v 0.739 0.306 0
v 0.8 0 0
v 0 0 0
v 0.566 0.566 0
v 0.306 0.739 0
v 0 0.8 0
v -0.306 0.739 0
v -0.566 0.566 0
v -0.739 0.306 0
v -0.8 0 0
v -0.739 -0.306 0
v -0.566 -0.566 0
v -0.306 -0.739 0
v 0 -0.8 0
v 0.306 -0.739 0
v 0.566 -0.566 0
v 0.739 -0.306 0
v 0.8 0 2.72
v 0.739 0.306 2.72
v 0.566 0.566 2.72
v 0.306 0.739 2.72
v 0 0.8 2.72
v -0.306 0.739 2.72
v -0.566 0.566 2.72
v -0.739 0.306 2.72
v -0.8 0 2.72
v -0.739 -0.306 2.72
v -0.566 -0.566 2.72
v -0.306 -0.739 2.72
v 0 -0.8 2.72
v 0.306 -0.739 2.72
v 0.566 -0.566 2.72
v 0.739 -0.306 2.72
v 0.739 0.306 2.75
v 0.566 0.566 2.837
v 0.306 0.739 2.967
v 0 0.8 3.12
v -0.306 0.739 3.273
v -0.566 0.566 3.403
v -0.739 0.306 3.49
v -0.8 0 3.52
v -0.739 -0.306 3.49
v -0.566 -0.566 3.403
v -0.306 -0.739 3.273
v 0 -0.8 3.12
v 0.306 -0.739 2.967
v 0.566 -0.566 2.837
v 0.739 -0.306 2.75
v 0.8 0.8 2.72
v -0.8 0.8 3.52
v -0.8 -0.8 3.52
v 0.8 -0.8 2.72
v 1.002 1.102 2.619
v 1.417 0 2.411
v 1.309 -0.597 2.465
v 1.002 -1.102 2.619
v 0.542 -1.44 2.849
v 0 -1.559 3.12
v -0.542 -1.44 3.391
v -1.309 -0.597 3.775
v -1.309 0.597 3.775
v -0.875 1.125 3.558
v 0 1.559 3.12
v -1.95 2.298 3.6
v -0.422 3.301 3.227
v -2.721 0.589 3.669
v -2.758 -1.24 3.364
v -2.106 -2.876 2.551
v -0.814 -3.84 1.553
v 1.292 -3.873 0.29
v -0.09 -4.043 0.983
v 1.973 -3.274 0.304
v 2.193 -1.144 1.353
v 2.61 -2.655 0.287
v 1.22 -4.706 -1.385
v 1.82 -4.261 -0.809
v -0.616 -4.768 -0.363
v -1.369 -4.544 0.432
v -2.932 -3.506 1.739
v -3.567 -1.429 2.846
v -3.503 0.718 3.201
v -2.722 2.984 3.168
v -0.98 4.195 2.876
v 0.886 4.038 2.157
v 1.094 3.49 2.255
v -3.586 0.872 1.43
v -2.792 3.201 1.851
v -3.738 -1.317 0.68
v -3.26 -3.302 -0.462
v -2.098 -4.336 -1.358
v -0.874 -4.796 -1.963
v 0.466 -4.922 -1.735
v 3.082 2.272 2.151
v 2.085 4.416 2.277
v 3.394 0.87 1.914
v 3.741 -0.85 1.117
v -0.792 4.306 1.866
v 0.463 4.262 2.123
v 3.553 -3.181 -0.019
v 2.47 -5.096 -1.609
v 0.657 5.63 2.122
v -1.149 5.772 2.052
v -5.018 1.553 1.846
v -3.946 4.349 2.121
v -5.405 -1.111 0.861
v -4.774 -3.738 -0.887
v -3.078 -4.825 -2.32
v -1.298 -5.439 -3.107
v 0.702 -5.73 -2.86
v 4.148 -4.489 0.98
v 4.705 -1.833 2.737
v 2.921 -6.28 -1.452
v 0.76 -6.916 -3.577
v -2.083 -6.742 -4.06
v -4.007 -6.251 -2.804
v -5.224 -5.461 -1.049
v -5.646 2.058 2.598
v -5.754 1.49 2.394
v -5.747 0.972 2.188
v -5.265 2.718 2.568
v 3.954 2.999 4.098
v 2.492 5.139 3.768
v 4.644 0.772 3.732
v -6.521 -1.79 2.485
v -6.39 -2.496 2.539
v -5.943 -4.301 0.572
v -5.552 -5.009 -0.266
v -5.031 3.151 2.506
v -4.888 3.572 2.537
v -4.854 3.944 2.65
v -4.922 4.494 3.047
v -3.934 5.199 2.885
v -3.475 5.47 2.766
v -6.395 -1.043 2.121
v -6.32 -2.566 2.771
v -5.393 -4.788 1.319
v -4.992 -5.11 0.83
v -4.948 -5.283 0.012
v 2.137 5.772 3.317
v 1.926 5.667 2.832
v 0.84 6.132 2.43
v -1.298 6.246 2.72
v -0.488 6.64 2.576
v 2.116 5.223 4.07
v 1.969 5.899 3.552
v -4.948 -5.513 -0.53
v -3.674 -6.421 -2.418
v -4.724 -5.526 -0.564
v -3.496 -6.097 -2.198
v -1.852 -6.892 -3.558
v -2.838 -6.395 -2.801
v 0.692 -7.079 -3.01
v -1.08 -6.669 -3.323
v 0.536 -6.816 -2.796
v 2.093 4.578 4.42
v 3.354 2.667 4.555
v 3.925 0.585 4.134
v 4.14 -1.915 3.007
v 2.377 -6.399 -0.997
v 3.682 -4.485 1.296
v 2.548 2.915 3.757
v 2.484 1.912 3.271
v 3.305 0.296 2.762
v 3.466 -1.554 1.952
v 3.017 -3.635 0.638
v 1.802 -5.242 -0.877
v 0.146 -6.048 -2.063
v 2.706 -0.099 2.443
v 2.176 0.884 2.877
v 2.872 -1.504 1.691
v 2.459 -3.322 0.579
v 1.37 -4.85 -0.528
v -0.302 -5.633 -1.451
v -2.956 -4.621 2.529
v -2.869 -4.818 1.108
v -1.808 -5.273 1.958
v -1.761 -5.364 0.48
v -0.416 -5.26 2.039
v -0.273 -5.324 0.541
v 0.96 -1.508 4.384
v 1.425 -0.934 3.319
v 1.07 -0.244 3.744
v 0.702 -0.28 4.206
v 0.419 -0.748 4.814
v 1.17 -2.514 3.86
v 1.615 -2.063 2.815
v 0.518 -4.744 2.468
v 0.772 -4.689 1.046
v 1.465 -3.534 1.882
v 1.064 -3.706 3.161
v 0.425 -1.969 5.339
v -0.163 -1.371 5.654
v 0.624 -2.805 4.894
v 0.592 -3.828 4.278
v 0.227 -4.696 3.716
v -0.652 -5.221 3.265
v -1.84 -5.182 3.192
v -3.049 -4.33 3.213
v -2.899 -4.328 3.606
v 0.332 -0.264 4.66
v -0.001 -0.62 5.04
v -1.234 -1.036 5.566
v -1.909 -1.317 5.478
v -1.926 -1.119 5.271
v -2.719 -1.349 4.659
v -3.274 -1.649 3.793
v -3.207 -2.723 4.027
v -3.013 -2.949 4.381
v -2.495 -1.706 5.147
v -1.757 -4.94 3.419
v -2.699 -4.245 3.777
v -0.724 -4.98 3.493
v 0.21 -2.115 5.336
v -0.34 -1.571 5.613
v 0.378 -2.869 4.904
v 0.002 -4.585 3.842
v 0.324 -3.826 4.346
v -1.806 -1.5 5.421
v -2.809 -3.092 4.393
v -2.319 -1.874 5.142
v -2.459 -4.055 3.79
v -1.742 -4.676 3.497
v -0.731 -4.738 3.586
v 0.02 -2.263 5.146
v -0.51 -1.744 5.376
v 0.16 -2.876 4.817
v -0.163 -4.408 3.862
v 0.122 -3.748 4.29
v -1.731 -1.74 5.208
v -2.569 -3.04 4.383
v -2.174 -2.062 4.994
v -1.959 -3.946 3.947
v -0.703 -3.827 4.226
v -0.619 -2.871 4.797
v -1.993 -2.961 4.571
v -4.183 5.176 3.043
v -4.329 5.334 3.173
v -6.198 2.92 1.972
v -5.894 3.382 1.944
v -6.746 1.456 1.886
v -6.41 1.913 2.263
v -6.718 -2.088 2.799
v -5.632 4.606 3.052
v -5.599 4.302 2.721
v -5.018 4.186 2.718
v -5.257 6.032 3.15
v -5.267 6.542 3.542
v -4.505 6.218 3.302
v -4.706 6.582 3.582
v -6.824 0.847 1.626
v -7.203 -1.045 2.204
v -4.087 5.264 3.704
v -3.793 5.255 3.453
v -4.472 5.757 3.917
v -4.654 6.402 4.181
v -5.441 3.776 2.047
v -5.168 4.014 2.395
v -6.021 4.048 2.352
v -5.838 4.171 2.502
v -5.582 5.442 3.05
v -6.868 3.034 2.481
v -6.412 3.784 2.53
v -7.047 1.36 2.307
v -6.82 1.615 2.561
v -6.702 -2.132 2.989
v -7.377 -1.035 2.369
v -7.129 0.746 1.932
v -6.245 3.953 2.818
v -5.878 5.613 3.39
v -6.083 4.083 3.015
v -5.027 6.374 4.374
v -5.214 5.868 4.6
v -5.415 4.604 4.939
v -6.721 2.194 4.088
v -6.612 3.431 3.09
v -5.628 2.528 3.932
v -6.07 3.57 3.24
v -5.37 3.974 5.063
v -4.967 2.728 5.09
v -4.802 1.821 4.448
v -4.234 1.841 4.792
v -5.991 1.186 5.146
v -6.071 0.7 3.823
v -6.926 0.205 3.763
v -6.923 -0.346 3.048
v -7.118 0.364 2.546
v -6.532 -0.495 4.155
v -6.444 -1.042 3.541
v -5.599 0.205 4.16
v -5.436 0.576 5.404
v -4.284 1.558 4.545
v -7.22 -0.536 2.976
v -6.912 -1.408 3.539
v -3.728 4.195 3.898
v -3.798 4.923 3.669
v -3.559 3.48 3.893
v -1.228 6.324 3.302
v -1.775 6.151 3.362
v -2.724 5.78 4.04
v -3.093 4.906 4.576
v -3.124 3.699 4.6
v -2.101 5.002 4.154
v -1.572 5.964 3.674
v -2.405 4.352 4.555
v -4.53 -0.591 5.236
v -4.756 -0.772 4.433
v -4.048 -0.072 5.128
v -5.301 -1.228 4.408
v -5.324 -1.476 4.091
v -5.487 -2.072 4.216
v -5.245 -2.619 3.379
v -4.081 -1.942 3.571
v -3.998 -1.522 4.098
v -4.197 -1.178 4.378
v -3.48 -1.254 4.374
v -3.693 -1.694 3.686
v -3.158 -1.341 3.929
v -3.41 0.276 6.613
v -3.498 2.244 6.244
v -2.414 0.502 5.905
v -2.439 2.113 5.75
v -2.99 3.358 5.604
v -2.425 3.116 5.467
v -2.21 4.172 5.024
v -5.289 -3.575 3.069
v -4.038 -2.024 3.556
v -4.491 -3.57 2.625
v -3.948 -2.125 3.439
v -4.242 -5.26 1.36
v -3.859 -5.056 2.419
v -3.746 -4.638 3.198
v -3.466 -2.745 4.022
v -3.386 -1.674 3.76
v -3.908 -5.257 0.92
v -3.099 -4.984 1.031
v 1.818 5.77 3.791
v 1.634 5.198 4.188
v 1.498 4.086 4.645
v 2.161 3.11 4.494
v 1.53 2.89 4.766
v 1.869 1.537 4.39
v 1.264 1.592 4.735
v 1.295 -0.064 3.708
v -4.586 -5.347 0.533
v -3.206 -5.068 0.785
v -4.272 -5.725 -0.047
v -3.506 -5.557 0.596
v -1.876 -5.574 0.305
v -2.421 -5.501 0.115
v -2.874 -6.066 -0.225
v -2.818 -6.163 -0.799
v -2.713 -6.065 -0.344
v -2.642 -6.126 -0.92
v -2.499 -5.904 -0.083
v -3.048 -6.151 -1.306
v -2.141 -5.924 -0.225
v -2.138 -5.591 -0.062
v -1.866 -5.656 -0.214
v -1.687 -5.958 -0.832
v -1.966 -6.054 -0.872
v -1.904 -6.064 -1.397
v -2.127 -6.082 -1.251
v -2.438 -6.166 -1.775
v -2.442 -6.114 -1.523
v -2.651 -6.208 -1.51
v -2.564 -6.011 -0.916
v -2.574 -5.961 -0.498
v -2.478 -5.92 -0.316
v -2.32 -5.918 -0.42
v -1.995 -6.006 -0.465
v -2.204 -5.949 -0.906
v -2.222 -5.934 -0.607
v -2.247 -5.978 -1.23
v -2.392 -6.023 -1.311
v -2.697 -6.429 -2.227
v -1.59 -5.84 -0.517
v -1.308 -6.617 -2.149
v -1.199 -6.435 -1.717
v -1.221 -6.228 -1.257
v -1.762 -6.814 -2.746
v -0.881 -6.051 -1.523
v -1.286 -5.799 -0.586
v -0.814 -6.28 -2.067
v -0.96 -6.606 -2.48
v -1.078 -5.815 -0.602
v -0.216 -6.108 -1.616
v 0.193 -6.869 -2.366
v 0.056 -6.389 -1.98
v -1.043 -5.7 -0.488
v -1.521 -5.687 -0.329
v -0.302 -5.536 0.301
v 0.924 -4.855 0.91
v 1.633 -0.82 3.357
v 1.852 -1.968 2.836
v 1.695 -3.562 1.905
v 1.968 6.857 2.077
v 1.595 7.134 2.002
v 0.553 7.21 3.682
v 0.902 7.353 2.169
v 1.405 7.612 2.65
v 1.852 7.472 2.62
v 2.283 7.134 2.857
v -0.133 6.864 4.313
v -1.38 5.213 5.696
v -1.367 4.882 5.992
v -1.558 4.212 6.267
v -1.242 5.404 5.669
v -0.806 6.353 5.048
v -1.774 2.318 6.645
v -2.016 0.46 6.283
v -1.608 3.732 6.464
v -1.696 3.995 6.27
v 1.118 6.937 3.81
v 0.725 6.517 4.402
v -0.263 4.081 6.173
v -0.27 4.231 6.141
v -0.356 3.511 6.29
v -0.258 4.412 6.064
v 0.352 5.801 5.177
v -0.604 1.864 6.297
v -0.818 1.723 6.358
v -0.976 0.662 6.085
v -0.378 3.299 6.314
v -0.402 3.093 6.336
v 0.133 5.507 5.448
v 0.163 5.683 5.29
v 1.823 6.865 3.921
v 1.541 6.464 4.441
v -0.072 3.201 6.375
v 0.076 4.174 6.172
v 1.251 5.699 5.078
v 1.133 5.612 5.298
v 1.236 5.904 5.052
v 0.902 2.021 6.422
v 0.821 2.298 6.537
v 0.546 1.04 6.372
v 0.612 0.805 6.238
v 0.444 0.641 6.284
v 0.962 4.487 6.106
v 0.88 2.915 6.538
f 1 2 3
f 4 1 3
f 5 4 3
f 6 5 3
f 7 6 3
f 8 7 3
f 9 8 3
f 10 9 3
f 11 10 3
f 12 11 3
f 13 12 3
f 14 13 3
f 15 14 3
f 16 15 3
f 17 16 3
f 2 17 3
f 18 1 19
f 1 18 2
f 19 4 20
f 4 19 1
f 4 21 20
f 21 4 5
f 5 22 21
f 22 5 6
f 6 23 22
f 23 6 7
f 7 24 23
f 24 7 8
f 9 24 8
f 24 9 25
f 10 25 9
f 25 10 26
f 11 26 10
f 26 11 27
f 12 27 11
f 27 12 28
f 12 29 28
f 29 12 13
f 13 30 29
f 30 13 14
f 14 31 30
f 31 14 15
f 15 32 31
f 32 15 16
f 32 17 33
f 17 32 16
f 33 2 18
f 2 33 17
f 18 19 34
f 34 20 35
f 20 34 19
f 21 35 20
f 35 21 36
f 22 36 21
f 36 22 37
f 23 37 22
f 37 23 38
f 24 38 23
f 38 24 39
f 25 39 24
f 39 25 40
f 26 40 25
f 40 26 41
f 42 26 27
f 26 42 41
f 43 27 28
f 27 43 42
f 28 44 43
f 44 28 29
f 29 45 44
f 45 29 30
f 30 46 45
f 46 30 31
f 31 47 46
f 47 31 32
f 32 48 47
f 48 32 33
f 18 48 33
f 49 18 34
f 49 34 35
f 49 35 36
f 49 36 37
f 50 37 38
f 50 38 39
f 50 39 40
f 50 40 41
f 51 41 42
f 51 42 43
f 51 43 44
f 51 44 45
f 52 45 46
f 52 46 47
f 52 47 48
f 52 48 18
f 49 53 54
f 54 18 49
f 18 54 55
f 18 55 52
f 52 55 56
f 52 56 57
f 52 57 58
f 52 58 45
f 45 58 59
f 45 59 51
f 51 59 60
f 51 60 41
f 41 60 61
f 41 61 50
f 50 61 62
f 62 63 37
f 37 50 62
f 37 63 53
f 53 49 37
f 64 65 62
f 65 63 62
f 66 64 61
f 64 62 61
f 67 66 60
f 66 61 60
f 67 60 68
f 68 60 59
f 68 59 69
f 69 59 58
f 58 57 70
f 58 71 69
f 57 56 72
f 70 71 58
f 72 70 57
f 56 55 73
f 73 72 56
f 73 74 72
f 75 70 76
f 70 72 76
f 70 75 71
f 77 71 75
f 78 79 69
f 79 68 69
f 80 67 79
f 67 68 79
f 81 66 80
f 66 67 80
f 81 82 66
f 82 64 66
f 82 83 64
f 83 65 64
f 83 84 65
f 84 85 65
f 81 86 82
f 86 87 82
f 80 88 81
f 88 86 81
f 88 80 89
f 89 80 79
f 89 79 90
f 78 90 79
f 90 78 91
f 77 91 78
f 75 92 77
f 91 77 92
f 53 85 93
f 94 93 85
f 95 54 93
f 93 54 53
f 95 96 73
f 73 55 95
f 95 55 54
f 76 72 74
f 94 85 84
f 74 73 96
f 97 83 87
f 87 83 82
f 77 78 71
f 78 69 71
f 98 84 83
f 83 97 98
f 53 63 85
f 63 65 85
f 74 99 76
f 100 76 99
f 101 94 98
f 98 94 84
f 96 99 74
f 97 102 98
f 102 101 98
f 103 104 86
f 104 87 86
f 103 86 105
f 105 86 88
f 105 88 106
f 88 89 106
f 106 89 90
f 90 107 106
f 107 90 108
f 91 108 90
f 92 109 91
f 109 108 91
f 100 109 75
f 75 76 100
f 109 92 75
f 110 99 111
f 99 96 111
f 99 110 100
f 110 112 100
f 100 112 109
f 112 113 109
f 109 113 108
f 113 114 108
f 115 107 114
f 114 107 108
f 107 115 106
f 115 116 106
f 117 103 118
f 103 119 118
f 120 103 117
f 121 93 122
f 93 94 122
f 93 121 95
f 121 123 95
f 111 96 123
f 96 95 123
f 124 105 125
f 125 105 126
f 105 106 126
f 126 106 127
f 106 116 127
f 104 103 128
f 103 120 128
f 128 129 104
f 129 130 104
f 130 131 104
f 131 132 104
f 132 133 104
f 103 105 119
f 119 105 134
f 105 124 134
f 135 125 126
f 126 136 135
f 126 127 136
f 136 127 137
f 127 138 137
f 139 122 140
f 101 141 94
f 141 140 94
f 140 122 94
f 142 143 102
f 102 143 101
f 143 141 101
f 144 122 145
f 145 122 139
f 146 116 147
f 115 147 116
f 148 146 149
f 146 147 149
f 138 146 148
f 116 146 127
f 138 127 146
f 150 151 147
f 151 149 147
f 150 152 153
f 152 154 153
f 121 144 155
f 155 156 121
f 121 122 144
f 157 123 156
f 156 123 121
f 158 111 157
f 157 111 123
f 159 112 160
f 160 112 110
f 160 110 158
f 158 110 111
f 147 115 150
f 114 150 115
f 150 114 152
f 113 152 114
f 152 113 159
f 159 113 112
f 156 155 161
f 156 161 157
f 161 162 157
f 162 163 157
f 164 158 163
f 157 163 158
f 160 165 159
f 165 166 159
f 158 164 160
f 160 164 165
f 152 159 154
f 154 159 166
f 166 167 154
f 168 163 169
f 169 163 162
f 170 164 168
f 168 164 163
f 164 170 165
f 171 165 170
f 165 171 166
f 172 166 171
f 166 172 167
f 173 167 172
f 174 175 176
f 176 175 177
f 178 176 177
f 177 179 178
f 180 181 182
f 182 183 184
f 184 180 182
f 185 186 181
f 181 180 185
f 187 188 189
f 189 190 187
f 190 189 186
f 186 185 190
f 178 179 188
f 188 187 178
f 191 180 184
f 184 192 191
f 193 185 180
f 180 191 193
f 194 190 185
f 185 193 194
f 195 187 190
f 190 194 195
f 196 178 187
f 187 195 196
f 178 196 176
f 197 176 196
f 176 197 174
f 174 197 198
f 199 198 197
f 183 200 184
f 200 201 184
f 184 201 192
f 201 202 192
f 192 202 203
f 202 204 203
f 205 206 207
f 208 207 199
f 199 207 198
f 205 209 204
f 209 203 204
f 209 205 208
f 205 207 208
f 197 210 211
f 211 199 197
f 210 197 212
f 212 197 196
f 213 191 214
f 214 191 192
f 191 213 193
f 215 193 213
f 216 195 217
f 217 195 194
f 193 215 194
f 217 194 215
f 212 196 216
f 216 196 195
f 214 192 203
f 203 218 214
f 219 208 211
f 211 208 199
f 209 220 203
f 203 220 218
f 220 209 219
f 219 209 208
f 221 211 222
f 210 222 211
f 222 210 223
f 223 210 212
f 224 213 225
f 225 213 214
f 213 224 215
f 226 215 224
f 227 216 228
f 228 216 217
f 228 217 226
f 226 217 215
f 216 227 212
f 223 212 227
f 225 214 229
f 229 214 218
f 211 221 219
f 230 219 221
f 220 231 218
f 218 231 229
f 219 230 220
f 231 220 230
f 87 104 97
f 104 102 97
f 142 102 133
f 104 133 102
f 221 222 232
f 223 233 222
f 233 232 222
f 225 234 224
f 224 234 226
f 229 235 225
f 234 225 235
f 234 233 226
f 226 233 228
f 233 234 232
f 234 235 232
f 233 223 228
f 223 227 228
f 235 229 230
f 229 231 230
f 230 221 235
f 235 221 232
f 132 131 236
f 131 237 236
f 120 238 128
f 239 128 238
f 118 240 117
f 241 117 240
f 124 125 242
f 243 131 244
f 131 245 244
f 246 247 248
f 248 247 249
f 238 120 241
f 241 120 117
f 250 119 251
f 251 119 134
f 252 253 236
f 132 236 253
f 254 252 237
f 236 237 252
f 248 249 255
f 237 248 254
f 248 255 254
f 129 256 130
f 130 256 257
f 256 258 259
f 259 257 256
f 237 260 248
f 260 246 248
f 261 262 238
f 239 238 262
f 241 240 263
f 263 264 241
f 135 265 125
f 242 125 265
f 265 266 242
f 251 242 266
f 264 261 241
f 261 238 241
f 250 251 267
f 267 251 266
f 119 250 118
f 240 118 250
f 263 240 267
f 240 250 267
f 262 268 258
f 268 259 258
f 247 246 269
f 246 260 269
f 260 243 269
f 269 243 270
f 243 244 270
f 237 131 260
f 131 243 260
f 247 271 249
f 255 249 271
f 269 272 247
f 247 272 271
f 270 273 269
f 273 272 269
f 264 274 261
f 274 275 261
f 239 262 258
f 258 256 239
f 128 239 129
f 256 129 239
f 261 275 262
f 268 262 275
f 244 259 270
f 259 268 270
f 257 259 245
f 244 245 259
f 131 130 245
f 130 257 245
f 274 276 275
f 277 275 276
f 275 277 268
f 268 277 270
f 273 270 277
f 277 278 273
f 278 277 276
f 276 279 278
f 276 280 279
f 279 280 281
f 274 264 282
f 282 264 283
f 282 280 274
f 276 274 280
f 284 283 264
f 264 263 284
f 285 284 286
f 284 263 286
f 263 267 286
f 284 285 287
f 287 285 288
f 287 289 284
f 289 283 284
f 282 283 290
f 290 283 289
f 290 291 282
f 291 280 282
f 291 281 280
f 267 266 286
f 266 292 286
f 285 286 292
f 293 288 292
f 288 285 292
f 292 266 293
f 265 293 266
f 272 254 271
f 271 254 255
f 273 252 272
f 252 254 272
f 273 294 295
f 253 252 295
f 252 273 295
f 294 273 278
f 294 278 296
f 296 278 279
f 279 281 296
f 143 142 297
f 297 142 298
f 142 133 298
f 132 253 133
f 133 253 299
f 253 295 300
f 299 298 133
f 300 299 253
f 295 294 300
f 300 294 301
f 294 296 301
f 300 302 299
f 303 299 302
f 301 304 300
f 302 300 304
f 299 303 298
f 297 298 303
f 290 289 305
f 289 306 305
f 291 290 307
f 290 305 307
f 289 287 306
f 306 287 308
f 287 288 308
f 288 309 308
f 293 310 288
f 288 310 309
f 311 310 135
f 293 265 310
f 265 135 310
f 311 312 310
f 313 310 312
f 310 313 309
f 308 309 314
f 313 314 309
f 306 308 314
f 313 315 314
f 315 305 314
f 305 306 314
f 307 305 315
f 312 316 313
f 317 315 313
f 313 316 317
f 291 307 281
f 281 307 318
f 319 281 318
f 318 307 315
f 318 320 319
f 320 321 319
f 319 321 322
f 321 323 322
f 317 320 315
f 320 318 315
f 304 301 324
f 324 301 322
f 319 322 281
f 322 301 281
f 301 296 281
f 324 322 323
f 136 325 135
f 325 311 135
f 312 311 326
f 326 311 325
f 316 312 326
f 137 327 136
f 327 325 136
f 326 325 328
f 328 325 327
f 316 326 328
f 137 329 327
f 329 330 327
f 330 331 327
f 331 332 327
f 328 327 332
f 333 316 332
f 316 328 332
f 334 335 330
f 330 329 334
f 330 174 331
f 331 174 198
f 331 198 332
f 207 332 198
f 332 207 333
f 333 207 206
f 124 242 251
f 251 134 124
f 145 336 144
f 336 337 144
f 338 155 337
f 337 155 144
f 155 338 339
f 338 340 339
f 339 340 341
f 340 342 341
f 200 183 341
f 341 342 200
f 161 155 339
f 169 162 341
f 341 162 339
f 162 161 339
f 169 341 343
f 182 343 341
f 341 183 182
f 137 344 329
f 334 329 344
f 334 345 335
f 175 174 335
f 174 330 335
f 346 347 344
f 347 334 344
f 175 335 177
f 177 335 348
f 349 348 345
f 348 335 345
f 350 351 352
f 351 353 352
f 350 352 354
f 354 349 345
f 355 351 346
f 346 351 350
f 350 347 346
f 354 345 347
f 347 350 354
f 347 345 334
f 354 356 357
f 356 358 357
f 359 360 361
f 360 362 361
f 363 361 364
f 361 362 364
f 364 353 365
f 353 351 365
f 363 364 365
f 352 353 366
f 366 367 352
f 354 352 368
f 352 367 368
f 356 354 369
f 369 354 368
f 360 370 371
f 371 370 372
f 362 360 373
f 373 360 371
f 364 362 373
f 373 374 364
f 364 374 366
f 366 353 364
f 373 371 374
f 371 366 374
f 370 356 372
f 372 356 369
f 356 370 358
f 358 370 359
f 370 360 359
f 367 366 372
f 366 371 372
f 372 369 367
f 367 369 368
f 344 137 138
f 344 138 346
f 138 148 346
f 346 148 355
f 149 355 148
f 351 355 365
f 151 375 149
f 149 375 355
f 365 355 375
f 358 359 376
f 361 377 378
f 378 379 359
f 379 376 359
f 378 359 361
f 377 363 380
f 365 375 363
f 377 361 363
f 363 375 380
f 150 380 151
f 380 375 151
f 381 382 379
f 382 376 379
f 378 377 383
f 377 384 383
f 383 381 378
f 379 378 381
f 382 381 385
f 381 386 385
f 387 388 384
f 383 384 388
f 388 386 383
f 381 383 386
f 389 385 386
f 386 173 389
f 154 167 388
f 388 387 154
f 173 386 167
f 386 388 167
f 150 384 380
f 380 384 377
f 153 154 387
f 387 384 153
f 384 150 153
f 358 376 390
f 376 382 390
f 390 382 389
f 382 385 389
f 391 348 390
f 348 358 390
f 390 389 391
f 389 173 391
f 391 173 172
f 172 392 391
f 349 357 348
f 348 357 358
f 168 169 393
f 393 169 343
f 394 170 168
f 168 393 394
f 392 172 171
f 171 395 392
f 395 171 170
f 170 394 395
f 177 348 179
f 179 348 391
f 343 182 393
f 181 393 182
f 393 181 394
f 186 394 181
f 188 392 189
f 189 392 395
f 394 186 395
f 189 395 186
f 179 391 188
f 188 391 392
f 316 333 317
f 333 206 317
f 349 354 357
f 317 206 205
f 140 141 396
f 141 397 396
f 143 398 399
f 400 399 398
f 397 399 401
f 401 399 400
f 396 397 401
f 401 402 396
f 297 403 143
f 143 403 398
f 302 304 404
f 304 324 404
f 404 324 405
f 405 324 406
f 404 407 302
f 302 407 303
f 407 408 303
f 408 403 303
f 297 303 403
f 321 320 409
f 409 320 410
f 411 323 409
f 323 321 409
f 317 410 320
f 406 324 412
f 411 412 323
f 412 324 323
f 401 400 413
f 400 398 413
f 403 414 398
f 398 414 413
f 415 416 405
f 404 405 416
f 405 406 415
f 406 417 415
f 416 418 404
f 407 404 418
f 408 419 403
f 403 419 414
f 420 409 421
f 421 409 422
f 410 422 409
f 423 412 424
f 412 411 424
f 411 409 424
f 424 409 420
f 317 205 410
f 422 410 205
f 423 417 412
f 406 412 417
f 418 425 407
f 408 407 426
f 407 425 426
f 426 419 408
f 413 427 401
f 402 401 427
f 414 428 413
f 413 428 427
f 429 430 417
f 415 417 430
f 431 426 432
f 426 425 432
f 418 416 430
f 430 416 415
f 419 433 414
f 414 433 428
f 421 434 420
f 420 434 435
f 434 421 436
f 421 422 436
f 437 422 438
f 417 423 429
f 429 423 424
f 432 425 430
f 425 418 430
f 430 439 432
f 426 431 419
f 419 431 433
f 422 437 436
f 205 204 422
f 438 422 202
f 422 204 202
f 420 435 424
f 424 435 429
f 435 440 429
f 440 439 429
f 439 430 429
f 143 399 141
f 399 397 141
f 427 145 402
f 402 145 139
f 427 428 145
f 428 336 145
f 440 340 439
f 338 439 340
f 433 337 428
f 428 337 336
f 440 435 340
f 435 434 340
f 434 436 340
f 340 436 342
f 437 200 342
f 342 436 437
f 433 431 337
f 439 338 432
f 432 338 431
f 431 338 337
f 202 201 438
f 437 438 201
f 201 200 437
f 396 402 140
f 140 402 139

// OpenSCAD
use <../lib.scad>
use <s/13746s01.scad>
use <s/13746s02.scad>
use <s/13746s03.scad>
function ldraw_lib__13746p01() = [
// 0 Minifig Hat with Small Pin, Women's Fedora with Large Red Bow and Black Feather Pattern
// 0 Name: 13746p01.dat
// 0 Author: Lisa Winter [LisaWinter]
// 0 !LDRAW_ORG Part UPDATE 2024-08
// 0 !LICENSE Licensed under CC BY 4.0 : see CAreadme.txt
// 
// 0 BFC CERTIFY CCW
  [0,"BFC","CERTIFY"],
  [0,"BFC","CCW"],
// 
// 0 !KEYWORDS Bricklink 13746pb001, Brickowl 210770, Rebrickable 13746pr0001
// 0 !KEYWORDS Red Harrington, Set 79108, Stagecoach Escape, The Lone Ranger
// 
// 0 !HISTORY 2013-08-14 {LEGO Digital Designer} Original part shape
// 0 !HISTORY 2024-09-04 [LisaWinter] File preparation for LDraw Parts Tracker
// 0 !HISTORY 2024-09-30 [OrionP] Official Update 2024-08
// 
// 0 // Main part
// 1 16 0 0 0 1 0 0 0 1 0 0 0 1 s\13746s01.dat
  [1,16,0,0,0,1,0,0,0,1,0,0,0,1, ldraw_lib__s__13746s01()],
// 0 // Bow
// 1 4 0 0 0 1 0 0 0 1 0 0 0 1 s\13746s02.dat
  [1,4,0,0,0,1,0,0,0,1,0,0,0,1, ldraw_lib__s__13746s02()],
// 0 // Feather
// 1 0 0 0 0 1 0 0 0 1 0 0 0 1 s\13746s03.dat
  [1,0,0,0,0,1,0,0,0,1,0,0,0,1, ldraw_lib__s__13746s03()],
];
module ldraw_lib__13746p01(step=0, col=false, unit=2/5, alt=false, line=0.2, solid=!$preview)
    makepoly(ldraw_lib__13746p01(), step=step, col=col, unit=unit, alt=alt, line=line, solid=solid);
ldraw_lib__13746p01(line=0.2);
